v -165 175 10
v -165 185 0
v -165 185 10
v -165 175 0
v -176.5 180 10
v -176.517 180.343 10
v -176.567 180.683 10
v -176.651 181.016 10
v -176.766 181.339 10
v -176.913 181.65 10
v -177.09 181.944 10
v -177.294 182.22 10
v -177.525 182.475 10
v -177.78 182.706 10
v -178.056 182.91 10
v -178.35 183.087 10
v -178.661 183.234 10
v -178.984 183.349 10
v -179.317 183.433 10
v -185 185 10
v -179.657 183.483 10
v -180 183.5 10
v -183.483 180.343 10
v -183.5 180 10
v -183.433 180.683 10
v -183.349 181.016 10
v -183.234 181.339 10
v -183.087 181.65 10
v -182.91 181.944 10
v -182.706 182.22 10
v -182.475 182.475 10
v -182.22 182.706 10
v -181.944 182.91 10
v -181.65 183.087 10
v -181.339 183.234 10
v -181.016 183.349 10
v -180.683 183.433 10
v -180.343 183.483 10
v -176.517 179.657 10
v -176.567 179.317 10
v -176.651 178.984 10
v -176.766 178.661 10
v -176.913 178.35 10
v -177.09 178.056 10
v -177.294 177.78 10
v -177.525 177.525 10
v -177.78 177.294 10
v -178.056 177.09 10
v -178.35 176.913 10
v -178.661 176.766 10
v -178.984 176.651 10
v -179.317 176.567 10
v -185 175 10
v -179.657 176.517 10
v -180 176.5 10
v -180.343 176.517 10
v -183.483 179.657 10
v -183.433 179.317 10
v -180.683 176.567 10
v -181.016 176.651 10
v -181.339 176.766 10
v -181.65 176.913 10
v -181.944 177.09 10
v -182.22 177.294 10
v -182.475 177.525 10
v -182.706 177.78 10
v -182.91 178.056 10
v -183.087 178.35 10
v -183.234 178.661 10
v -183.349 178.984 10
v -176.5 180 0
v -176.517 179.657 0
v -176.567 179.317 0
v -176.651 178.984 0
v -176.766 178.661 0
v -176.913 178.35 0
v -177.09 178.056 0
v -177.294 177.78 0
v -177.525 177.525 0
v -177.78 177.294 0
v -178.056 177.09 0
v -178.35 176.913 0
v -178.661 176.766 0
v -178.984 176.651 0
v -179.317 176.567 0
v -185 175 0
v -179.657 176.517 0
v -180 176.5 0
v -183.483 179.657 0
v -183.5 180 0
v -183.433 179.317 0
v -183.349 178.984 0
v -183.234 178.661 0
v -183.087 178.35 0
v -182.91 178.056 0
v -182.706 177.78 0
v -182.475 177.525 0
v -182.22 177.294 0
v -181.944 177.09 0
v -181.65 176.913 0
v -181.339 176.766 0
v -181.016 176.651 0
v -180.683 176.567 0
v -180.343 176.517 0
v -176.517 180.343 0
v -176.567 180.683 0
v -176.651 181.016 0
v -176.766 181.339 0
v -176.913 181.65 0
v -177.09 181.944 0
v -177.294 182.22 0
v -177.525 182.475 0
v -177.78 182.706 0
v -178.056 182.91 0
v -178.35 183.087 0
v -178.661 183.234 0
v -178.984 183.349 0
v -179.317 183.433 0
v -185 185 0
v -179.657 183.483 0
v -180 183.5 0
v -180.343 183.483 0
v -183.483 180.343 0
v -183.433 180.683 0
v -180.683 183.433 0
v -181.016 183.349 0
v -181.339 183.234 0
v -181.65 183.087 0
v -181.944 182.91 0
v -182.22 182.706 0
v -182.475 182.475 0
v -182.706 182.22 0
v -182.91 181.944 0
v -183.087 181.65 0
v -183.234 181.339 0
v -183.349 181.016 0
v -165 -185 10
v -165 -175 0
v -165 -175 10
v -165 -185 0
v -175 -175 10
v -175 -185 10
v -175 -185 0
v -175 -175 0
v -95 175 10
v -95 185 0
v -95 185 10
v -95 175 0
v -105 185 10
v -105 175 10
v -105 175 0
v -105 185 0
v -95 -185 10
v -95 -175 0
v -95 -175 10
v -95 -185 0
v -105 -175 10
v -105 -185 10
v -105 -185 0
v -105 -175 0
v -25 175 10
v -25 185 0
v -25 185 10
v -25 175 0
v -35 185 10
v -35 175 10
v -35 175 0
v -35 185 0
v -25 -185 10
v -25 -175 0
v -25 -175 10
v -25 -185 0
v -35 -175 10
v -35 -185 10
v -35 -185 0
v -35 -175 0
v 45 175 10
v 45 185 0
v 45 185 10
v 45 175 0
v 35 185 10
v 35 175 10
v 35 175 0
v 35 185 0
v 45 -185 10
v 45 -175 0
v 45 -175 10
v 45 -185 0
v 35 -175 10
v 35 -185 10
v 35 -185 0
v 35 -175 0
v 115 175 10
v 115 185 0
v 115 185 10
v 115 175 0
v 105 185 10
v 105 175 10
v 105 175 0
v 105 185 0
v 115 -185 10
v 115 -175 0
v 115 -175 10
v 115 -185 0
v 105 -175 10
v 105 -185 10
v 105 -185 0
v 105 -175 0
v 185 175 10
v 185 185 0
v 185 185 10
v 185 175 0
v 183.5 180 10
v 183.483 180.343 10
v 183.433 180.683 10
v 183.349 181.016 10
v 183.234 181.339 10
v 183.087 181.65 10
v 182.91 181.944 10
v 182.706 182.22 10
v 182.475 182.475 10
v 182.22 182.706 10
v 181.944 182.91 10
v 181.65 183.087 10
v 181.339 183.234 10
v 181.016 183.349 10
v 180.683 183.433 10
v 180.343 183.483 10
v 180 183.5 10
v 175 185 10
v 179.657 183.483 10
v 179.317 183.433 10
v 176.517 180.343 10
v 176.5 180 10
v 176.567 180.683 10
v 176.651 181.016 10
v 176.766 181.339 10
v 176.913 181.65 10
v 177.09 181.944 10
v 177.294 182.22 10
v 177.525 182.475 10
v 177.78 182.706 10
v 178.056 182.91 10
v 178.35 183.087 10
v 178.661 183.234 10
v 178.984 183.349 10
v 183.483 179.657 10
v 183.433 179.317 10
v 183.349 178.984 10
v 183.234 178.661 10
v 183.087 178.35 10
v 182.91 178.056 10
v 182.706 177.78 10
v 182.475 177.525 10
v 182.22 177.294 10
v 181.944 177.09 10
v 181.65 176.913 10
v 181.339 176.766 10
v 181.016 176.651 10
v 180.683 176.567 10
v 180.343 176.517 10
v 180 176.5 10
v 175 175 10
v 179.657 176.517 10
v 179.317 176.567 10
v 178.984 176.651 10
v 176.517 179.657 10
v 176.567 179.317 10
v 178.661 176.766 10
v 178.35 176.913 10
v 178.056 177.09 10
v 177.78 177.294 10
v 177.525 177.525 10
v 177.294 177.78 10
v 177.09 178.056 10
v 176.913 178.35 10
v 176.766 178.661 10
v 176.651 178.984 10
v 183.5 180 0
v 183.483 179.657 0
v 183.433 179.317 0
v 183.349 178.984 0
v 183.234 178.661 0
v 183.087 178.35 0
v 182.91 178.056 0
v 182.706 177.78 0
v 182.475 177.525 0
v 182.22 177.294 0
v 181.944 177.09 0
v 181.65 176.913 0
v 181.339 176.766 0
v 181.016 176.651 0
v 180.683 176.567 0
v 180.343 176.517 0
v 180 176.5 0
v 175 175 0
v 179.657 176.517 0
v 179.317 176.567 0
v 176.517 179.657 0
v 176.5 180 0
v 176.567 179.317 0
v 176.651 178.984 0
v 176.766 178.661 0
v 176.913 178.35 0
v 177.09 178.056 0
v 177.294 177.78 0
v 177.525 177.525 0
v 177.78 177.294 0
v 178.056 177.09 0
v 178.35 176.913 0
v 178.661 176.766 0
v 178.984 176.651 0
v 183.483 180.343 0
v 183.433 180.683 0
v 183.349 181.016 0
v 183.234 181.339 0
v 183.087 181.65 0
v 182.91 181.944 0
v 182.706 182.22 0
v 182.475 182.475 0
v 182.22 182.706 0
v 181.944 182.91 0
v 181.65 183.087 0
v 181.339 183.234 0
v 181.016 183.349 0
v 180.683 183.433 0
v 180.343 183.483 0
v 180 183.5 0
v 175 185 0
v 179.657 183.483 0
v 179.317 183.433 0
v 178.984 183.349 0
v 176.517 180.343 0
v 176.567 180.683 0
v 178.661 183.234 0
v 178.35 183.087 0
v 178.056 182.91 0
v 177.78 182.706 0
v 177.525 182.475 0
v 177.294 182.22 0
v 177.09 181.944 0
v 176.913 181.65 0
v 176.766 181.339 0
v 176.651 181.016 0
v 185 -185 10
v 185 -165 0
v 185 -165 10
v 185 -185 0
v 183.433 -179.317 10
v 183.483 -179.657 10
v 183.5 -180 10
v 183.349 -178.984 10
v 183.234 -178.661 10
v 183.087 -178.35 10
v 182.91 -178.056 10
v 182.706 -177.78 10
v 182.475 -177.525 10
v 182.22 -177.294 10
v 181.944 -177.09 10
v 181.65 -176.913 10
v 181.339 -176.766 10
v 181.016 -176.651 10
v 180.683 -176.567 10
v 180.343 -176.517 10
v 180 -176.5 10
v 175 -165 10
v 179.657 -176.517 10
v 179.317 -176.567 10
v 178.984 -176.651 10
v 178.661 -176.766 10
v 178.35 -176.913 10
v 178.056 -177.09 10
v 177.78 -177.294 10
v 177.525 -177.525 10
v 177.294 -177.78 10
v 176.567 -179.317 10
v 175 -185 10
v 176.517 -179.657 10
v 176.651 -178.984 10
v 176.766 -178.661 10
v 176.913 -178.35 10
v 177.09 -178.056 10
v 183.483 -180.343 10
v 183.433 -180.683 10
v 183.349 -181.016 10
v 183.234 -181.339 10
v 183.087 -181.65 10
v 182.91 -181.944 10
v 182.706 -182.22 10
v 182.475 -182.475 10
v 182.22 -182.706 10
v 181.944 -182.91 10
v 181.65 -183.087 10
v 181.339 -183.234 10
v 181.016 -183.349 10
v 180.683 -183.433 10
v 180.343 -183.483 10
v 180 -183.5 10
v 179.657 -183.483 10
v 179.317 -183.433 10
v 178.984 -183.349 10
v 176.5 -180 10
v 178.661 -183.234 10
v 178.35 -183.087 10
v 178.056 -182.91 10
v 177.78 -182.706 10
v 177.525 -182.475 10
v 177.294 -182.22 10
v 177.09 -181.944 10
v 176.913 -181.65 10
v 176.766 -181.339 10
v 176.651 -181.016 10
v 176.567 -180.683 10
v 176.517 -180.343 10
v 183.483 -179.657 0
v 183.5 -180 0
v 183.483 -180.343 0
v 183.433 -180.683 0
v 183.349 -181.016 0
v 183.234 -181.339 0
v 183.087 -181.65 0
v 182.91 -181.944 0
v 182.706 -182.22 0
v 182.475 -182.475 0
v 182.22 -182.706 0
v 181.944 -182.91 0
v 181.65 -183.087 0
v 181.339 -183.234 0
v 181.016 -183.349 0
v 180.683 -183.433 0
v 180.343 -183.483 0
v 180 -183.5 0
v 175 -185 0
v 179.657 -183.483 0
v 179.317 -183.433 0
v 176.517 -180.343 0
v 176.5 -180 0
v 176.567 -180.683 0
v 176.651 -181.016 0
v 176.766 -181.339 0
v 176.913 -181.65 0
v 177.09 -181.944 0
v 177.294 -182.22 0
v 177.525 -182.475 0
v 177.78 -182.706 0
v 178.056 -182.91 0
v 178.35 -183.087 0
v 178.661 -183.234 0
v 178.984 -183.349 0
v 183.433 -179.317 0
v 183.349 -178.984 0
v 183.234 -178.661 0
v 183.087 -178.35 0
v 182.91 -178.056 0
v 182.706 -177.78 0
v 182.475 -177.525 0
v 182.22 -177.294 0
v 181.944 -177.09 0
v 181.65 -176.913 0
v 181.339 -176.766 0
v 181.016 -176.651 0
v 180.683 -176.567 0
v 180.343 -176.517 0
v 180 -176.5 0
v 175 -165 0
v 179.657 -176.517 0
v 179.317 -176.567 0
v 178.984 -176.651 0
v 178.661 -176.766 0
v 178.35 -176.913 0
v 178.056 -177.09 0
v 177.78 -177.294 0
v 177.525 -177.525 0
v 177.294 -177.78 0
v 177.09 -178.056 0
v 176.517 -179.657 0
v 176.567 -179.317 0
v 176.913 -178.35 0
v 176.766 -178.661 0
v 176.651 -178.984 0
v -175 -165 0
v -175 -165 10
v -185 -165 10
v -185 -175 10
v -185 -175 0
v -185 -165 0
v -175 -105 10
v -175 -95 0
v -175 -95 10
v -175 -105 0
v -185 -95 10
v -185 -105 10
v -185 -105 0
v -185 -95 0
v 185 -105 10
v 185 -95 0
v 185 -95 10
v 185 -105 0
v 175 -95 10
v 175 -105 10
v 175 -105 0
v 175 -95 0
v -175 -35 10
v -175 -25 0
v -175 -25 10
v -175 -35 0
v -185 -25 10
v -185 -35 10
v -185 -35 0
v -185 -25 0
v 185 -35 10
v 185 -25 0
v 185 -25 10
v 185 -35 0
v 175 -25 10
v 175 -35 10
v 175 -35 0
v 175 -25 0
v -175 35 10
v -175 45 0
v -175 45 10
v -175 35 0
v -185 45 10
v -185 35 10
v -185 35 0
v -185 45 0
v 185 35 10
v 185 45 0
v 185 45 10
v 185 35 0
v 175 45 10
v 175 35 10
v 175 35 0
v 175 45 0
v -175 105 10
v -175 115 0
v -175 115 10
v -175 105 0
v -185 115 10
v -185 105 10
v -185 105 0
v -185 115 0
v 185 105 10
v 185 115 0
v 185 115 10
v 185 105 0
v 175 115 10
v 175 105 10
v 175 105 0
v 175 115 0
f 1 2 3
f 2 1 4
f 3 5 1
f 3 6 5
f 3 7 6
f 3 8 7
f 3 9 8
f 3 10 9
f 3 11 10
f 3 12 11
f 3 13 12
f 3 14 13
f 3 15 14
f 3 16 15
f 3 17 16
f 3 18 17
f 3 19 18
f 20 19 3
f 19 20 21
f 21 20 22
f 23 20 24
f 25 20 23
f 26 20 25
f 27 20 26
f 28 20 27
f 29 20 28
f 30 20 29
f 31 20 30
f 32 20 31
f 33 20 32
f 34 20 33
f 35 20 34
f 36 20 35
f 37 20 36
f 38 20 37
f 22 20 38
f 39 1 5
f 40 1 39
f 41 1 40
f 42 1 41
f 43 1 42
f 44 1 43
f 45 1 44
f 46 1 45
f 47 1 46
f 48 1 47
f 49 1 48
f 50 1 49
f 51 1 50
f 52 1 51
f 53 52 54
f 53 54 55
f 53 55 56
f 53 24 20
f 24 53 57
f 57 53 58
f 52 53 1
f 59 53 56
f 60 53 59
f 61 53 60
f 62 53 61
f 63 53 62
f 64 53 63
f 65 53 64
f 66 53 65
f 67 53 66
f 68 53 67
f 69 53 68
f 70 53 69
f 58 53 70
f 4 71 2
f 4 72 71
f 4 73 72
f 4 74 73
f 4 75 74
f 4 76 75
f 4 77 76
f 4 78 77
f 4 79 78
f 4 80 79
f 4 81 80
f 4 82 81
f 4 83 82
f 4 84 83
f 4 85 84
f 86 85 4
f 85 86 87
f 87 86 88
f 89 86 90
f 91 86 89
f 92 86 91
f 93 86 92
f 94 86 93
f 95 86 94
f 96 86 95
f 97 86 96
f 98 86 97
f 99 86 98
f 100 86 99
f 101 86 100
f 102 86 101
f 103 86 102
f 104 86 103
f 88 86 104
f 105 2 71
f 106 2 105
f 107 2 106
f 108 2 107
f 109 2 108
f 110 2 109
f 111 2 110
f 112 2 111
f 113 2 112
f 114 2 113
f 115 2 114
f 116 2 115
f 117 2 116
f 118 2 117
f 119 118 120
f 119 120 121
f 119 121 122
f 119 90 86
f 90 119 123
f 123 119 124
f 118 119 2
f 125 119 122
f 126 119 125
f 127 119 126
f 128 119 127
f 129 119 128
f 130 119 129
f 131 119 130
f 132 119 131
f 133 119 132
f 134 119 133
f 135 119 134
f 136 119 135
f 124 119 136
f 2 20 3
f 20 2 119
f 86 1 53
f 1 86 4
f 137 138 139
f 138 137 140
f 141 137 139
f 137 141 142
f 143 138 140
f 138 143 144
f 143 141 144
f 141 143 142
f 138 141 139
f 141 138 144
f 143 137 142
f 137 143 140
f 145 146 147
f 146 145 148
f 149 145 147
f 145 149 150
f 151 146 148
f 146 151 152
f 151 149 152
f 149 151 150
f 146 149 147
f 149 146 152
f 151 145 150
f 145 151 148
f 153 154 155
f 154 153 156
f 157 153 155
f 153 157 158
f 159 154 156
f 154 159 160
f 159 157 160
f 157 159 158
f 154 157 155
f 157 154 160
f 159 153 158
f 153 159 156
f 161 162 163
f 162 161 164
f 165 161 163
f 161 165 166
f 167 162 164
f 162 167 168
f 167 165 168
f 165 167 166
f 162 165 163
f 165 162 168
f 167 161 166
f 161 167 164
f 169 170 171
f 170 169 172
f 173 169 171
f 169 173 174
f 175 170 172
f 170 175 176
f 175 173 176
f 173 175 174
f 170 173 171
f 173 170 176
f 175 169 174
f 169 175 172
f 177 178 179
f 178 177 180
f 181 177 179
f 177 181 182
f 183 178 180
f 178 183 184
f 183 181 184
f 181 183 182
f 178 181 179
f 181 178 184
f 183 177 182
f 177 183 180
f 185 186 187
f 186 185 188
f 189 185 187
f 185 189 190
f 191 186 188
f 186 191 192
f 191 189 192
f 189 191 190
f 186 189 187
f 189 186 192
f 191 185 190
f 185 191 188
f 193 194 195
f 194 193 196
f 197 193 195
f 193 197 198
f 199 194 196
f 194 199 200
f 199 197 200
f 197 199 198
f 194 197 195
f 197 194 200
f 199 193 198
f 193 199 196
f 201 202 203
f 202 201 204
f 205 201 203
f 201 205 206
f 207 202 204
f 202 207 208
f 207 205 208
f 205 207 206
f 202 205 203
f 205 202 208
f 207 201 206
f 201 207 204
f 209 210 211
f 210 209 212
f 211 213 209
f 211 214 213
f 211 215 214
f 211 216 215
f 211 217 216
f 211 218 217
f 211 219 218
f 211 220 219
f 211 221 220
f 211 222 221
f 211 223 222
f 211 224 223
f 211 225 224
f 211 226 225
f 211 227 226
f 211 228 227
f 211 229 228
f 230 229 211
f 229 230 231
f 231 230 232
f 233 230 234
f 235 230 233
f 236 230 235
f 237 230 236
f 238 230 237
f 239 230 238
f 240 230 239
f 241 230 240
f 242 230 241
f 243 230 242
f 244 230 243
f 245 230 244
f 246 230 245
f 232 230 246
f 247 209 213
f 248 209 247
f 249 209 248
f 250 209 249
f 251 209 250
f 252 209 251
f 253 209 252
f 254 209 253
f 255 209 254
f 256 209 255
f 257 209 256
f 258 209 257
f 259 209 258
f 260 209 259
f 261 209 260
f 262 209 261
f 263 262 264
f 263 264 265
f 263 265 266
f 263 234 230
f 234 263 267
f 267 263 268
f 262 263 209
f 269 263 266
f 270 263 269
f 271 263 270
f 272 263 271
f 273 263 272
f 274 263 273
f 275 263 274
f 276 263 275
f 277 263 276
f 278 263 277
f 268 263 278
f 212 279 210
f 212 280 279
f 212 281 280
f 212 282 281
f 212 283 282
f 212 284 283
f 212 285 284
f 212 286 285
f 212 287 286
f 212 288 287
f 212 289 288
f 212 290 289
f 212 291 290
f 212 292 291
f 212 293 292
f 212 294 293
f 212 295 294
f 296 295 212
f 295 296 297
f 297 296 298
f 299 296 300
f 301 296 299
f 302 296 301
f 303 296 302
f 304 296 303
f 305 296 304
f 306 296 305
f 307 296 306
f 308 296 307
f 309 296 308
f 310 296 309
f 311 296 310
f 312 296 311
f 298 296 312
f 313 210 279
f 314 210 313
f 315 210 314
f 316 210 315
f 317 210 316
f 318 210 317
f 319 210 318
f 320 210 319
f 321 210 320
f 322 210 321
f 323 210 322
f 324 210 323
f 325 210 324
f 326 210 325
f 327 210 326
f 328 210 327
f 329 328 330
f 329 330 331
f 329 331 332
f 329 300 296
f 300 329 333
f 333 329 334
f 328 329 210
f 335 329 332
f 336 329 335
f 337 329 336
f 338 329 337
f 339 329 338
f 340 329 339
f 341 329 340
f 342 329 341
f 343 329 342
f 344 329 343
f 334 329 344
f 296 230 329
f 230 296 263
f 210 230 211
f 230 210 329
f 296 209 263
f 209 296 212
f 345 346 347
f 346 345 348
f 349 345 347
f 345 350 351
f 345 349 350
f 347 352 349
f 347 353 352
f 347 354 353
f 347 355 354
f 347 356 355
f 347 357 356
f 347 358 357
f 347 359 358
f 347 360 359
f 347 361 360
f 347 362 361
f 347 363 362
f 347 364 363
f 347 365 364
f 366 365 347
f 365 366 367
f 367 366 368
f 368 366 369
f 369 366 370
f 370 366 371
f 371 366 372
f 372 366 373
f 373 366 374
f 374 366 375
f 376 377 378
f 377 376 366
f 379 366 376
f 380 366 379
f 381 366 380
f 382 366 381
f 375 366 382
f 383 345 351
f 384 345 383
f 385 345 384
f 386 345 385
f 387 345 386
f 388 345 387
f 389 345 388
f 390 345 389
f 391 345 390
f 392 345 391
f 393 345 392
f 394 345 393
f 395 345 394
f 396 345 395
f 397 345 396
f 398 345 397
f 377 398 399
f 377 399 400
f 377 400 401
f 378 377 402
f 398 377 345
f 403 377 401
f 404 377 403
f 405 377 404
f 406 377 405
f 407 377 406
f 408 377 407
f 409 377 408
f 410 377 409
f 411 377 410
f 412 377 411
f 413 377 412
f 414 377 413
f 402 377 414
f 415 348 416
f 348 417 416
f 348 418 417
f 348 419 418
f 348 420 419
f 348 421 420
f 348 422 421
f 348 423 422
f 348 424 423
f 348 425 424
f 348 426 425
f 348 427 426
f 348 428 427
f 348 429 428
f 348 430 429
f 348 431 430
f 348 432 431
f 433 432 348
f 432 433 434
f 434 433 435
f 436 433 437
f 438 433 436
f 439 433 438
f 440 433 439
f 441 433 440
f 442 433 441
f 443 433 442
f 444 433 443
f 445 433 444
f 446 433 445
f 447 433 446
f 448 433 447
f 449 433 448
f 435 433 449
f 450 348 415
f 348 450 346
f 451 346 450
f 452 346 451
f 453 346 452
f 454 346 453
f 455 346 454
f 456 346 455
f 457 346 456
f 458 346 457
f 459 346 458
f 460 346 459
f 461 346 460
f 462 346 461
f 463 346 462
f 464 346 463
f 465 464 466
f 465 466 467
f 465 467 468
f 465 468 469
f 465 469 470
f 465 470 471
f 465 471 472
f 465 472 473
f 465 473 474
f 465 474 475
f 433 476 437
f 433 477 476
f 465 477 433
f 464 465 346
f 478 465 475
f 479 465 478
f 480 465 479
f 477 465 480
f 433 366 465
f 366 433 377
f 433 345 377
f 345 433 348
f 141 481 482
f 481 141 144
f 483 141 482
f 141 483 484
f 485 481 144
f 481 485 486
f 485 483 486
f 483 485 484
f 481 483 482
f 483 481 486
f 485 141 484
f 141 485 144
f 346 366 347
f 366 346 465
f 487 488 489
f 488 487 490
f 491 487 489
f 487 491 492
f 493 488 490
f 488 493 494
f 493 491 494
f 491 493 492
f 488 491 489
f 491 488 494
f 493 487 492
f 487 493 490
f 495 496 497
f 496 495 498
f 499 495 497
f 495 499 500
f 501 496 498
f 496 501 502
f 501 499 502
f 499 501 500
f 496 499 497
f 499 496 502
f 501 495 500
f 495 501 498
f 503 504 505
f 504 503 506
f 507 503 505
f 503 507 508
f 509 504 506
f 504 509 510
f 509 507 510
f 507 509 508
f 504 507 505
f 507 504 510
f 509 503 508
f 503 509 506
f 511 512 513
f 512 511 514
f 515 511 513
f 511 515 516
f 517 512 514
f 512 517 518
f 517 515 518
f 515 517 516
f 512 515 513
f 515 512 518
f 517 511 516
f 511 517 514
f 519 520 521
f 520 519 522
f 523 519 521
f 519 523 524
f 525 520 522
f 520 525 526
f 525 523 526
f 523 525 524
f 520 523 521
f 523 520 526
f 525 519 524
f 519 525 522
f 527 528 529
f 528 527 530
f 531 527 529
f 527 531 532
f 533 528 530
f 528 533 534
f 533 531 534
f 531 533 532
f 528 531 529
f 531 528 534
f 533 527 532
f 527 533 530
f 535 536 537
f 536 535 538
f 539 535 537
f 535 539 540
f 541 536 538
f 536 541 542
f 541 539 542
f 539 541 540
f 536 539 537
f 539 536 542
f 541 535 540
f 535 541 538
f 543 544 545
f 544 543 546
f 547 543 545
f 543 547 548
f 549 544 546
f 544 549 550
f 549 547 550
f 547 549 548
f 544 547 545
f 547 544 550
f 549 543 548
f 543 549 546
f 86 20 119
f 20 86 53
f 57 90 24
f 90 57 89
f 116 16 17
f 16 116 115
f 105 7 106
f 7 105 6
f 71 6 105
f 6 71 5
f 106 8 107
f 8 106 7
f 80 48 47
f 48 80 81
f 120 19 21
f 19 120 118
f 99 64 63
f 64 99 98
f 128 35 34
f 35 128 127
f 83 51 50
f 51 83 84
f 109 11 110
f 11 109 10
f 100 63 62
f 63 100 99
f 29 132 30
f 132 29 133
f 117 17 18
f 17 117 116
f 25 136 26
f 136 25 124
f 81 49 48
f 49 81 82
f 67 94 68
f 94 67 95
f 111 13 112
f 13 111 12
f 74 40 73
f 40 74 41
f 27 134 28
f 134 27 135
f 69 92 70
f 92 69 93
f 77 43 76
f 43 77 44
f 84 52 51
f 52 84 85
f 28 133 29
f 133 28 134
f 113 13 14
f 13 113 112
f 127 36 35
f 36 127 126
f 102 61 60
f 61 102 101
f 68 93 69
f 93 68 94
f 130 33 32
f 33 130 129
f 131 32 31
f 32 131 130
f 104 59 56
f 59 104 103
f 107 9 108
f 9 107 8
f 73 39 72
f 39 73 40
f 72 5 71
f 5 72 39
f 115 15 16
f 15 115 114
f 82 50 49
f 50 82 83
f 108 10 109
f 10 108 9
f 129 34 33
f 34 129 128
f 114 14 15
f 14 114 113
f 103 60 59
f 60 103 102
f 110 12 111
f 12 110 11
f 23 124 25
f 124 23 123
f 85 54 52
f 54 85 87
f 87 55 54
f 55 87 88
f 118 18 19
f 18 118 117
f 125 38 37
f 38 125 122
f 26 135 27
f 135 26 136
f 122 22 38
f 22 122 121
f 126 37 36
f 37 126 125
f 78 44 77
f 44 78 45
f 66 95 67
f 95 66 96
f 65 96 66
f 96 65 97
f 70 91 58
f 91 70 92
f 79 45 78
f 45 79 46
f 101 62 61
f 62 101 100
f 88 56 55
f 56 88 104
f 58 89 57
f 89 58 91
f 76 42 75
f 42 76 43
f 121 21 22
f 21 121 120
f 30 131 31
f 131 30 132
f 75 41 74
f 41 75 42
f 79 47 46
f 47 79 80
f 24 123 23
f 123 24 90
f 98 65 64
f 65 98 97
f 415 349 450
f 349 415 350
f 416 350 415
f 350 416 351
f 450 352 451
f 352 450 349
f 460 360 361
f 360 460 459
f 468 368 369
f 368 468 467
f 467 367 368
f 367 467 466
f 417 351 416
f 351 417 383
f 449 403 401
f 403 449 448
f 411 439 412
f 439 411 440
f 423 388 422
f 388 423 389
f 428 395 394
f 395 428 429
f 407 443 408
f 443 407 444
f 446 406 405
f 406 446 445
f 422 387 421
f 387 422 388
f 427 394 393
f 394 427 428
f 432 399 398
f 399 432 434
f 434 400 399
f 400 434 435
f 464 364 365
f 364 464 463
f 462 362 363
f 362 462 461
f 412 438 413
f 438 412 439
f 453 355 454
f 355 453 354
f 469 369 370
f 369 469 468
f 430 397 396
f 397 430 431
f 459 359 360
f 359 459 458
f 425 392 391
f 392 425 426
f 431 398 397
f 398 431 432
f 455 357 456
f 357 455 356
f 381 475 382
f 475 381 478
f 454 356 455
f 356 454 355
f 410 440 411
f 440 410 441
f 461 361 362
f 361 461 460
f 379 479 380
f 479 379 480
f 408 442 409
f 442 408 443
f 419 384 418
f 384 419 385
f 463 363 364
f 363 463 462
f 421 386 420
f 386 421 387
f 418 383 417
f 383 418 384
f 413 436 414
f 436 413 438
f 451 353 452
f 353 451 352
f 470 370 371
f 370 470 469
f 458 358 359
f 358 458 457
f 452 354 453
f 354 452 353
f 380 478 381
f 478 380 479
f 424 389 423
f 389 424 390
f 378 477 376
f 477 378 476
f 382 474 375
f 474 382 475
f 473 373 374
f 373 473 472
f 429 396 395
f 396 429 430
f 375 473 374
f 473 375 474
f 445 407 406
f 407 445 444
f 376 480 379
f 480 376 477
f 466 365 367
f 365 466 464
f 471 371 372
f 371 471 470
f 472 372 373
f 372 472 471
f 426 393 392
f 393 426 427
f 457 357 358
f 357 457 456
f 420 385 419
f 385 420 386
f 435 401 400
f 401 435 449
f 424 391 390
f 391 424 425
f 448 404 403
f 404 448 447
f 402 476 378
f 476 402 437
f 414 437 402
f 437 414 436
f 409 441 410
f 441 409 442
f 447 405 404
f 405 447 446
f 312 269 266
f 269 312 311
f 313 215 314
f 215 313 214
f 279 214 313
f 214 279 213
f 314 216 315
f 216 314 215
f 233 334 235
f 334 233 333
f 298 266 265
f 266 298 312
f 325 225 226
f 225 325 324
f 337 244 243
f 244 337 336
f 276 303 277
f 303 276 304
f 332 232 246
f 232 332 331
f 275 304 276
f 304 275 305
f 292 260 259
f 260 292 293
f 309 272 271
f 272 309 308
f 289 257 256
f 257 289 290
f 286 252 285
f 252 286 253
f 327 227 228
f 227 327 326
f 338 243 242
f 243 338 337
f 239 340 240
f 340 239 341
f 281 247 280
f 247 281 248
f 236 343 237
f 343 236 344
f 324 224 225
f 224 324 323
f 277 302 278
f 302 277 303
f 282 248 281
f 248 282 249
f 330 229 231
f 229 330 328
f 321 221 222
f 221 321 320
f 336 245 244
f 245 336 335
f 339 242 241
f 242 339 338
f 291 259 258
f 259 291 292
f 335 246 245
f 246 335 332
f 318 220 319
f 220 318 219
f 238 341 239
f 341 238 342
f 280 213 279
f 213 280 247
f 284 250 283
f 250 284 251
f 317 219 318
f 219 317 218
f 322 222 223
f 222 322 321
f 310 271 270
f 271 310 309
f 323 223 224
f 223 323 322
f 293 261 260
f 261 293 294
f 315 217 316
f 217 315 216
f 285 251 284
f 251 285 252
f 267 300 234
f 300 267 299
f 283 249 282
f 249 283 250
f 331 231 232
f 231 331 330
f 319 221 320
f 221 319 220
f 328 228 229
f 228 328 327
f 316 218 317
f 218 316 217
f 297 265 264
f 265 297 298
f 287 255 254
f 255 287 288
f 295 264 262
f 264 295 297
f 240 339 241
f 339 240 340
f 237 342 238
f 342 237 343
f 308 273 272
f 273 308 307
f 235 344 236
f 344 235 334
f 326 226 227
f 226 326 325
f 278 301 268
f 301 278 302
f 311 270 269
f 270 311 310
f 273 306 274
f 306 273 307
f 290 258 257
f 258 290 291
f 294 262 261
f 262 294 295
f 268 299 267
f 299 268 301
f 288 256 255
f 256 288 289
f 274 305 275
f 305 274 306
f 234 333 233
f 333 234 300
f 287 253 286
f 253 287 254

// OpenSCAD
// ring_27.scad - ring index 27 (z bottom = 270 mm)
$fn = 64; bar = 10; half_b = bar/2; outer = 370; half_outer = outer/2;
front_y = 180; back_y = -180; left_x = -180; right_x = 180;
x_centers = [-170, -100, -30, 40, 110, 180];
z_centers = [5, 85, 155, 225, 295, 365, 435, 505, 575, 645, 715]; ring_z = 270;
module place_box(cx, cy, sx, sy) { translate([cx - sx/2, cy - sy/2, 0]) cube([sx, sy, bar]); }

difference() { union() {
    for (x = x_centers) { place_box(x, front_y, bar, bar); place_box(x, back_y, bar, bar); }
    for (y = x_centers) { place_box(left_x, y, bar, bar); place_box(right_x, y, bar, bar); }
    for (zc = z_centers) if ((zc - half_b < ring_z + bar) && (zc + half_b > ring_z)) {
        translate([-half_outer, front_y - half_b, 0]) cube([outer, bar, bar]);
        translate([-half_outer, back_y - half_b, 0])  cube([outer, bar, bar]);
        translate([left_x - half_b, -half_outer, 0])  cube([bar, outer, bar]);
        translate([right_x - half_b, -half_outer, 0]) cube([bar, outer, bar]);
    }
  }
  for (cx = [-180, 180]) for (cy = [-180, 180]) translate([cx, cy, 0]) cylinder(h = bar, r = 3.5, $fn = 64);
}
